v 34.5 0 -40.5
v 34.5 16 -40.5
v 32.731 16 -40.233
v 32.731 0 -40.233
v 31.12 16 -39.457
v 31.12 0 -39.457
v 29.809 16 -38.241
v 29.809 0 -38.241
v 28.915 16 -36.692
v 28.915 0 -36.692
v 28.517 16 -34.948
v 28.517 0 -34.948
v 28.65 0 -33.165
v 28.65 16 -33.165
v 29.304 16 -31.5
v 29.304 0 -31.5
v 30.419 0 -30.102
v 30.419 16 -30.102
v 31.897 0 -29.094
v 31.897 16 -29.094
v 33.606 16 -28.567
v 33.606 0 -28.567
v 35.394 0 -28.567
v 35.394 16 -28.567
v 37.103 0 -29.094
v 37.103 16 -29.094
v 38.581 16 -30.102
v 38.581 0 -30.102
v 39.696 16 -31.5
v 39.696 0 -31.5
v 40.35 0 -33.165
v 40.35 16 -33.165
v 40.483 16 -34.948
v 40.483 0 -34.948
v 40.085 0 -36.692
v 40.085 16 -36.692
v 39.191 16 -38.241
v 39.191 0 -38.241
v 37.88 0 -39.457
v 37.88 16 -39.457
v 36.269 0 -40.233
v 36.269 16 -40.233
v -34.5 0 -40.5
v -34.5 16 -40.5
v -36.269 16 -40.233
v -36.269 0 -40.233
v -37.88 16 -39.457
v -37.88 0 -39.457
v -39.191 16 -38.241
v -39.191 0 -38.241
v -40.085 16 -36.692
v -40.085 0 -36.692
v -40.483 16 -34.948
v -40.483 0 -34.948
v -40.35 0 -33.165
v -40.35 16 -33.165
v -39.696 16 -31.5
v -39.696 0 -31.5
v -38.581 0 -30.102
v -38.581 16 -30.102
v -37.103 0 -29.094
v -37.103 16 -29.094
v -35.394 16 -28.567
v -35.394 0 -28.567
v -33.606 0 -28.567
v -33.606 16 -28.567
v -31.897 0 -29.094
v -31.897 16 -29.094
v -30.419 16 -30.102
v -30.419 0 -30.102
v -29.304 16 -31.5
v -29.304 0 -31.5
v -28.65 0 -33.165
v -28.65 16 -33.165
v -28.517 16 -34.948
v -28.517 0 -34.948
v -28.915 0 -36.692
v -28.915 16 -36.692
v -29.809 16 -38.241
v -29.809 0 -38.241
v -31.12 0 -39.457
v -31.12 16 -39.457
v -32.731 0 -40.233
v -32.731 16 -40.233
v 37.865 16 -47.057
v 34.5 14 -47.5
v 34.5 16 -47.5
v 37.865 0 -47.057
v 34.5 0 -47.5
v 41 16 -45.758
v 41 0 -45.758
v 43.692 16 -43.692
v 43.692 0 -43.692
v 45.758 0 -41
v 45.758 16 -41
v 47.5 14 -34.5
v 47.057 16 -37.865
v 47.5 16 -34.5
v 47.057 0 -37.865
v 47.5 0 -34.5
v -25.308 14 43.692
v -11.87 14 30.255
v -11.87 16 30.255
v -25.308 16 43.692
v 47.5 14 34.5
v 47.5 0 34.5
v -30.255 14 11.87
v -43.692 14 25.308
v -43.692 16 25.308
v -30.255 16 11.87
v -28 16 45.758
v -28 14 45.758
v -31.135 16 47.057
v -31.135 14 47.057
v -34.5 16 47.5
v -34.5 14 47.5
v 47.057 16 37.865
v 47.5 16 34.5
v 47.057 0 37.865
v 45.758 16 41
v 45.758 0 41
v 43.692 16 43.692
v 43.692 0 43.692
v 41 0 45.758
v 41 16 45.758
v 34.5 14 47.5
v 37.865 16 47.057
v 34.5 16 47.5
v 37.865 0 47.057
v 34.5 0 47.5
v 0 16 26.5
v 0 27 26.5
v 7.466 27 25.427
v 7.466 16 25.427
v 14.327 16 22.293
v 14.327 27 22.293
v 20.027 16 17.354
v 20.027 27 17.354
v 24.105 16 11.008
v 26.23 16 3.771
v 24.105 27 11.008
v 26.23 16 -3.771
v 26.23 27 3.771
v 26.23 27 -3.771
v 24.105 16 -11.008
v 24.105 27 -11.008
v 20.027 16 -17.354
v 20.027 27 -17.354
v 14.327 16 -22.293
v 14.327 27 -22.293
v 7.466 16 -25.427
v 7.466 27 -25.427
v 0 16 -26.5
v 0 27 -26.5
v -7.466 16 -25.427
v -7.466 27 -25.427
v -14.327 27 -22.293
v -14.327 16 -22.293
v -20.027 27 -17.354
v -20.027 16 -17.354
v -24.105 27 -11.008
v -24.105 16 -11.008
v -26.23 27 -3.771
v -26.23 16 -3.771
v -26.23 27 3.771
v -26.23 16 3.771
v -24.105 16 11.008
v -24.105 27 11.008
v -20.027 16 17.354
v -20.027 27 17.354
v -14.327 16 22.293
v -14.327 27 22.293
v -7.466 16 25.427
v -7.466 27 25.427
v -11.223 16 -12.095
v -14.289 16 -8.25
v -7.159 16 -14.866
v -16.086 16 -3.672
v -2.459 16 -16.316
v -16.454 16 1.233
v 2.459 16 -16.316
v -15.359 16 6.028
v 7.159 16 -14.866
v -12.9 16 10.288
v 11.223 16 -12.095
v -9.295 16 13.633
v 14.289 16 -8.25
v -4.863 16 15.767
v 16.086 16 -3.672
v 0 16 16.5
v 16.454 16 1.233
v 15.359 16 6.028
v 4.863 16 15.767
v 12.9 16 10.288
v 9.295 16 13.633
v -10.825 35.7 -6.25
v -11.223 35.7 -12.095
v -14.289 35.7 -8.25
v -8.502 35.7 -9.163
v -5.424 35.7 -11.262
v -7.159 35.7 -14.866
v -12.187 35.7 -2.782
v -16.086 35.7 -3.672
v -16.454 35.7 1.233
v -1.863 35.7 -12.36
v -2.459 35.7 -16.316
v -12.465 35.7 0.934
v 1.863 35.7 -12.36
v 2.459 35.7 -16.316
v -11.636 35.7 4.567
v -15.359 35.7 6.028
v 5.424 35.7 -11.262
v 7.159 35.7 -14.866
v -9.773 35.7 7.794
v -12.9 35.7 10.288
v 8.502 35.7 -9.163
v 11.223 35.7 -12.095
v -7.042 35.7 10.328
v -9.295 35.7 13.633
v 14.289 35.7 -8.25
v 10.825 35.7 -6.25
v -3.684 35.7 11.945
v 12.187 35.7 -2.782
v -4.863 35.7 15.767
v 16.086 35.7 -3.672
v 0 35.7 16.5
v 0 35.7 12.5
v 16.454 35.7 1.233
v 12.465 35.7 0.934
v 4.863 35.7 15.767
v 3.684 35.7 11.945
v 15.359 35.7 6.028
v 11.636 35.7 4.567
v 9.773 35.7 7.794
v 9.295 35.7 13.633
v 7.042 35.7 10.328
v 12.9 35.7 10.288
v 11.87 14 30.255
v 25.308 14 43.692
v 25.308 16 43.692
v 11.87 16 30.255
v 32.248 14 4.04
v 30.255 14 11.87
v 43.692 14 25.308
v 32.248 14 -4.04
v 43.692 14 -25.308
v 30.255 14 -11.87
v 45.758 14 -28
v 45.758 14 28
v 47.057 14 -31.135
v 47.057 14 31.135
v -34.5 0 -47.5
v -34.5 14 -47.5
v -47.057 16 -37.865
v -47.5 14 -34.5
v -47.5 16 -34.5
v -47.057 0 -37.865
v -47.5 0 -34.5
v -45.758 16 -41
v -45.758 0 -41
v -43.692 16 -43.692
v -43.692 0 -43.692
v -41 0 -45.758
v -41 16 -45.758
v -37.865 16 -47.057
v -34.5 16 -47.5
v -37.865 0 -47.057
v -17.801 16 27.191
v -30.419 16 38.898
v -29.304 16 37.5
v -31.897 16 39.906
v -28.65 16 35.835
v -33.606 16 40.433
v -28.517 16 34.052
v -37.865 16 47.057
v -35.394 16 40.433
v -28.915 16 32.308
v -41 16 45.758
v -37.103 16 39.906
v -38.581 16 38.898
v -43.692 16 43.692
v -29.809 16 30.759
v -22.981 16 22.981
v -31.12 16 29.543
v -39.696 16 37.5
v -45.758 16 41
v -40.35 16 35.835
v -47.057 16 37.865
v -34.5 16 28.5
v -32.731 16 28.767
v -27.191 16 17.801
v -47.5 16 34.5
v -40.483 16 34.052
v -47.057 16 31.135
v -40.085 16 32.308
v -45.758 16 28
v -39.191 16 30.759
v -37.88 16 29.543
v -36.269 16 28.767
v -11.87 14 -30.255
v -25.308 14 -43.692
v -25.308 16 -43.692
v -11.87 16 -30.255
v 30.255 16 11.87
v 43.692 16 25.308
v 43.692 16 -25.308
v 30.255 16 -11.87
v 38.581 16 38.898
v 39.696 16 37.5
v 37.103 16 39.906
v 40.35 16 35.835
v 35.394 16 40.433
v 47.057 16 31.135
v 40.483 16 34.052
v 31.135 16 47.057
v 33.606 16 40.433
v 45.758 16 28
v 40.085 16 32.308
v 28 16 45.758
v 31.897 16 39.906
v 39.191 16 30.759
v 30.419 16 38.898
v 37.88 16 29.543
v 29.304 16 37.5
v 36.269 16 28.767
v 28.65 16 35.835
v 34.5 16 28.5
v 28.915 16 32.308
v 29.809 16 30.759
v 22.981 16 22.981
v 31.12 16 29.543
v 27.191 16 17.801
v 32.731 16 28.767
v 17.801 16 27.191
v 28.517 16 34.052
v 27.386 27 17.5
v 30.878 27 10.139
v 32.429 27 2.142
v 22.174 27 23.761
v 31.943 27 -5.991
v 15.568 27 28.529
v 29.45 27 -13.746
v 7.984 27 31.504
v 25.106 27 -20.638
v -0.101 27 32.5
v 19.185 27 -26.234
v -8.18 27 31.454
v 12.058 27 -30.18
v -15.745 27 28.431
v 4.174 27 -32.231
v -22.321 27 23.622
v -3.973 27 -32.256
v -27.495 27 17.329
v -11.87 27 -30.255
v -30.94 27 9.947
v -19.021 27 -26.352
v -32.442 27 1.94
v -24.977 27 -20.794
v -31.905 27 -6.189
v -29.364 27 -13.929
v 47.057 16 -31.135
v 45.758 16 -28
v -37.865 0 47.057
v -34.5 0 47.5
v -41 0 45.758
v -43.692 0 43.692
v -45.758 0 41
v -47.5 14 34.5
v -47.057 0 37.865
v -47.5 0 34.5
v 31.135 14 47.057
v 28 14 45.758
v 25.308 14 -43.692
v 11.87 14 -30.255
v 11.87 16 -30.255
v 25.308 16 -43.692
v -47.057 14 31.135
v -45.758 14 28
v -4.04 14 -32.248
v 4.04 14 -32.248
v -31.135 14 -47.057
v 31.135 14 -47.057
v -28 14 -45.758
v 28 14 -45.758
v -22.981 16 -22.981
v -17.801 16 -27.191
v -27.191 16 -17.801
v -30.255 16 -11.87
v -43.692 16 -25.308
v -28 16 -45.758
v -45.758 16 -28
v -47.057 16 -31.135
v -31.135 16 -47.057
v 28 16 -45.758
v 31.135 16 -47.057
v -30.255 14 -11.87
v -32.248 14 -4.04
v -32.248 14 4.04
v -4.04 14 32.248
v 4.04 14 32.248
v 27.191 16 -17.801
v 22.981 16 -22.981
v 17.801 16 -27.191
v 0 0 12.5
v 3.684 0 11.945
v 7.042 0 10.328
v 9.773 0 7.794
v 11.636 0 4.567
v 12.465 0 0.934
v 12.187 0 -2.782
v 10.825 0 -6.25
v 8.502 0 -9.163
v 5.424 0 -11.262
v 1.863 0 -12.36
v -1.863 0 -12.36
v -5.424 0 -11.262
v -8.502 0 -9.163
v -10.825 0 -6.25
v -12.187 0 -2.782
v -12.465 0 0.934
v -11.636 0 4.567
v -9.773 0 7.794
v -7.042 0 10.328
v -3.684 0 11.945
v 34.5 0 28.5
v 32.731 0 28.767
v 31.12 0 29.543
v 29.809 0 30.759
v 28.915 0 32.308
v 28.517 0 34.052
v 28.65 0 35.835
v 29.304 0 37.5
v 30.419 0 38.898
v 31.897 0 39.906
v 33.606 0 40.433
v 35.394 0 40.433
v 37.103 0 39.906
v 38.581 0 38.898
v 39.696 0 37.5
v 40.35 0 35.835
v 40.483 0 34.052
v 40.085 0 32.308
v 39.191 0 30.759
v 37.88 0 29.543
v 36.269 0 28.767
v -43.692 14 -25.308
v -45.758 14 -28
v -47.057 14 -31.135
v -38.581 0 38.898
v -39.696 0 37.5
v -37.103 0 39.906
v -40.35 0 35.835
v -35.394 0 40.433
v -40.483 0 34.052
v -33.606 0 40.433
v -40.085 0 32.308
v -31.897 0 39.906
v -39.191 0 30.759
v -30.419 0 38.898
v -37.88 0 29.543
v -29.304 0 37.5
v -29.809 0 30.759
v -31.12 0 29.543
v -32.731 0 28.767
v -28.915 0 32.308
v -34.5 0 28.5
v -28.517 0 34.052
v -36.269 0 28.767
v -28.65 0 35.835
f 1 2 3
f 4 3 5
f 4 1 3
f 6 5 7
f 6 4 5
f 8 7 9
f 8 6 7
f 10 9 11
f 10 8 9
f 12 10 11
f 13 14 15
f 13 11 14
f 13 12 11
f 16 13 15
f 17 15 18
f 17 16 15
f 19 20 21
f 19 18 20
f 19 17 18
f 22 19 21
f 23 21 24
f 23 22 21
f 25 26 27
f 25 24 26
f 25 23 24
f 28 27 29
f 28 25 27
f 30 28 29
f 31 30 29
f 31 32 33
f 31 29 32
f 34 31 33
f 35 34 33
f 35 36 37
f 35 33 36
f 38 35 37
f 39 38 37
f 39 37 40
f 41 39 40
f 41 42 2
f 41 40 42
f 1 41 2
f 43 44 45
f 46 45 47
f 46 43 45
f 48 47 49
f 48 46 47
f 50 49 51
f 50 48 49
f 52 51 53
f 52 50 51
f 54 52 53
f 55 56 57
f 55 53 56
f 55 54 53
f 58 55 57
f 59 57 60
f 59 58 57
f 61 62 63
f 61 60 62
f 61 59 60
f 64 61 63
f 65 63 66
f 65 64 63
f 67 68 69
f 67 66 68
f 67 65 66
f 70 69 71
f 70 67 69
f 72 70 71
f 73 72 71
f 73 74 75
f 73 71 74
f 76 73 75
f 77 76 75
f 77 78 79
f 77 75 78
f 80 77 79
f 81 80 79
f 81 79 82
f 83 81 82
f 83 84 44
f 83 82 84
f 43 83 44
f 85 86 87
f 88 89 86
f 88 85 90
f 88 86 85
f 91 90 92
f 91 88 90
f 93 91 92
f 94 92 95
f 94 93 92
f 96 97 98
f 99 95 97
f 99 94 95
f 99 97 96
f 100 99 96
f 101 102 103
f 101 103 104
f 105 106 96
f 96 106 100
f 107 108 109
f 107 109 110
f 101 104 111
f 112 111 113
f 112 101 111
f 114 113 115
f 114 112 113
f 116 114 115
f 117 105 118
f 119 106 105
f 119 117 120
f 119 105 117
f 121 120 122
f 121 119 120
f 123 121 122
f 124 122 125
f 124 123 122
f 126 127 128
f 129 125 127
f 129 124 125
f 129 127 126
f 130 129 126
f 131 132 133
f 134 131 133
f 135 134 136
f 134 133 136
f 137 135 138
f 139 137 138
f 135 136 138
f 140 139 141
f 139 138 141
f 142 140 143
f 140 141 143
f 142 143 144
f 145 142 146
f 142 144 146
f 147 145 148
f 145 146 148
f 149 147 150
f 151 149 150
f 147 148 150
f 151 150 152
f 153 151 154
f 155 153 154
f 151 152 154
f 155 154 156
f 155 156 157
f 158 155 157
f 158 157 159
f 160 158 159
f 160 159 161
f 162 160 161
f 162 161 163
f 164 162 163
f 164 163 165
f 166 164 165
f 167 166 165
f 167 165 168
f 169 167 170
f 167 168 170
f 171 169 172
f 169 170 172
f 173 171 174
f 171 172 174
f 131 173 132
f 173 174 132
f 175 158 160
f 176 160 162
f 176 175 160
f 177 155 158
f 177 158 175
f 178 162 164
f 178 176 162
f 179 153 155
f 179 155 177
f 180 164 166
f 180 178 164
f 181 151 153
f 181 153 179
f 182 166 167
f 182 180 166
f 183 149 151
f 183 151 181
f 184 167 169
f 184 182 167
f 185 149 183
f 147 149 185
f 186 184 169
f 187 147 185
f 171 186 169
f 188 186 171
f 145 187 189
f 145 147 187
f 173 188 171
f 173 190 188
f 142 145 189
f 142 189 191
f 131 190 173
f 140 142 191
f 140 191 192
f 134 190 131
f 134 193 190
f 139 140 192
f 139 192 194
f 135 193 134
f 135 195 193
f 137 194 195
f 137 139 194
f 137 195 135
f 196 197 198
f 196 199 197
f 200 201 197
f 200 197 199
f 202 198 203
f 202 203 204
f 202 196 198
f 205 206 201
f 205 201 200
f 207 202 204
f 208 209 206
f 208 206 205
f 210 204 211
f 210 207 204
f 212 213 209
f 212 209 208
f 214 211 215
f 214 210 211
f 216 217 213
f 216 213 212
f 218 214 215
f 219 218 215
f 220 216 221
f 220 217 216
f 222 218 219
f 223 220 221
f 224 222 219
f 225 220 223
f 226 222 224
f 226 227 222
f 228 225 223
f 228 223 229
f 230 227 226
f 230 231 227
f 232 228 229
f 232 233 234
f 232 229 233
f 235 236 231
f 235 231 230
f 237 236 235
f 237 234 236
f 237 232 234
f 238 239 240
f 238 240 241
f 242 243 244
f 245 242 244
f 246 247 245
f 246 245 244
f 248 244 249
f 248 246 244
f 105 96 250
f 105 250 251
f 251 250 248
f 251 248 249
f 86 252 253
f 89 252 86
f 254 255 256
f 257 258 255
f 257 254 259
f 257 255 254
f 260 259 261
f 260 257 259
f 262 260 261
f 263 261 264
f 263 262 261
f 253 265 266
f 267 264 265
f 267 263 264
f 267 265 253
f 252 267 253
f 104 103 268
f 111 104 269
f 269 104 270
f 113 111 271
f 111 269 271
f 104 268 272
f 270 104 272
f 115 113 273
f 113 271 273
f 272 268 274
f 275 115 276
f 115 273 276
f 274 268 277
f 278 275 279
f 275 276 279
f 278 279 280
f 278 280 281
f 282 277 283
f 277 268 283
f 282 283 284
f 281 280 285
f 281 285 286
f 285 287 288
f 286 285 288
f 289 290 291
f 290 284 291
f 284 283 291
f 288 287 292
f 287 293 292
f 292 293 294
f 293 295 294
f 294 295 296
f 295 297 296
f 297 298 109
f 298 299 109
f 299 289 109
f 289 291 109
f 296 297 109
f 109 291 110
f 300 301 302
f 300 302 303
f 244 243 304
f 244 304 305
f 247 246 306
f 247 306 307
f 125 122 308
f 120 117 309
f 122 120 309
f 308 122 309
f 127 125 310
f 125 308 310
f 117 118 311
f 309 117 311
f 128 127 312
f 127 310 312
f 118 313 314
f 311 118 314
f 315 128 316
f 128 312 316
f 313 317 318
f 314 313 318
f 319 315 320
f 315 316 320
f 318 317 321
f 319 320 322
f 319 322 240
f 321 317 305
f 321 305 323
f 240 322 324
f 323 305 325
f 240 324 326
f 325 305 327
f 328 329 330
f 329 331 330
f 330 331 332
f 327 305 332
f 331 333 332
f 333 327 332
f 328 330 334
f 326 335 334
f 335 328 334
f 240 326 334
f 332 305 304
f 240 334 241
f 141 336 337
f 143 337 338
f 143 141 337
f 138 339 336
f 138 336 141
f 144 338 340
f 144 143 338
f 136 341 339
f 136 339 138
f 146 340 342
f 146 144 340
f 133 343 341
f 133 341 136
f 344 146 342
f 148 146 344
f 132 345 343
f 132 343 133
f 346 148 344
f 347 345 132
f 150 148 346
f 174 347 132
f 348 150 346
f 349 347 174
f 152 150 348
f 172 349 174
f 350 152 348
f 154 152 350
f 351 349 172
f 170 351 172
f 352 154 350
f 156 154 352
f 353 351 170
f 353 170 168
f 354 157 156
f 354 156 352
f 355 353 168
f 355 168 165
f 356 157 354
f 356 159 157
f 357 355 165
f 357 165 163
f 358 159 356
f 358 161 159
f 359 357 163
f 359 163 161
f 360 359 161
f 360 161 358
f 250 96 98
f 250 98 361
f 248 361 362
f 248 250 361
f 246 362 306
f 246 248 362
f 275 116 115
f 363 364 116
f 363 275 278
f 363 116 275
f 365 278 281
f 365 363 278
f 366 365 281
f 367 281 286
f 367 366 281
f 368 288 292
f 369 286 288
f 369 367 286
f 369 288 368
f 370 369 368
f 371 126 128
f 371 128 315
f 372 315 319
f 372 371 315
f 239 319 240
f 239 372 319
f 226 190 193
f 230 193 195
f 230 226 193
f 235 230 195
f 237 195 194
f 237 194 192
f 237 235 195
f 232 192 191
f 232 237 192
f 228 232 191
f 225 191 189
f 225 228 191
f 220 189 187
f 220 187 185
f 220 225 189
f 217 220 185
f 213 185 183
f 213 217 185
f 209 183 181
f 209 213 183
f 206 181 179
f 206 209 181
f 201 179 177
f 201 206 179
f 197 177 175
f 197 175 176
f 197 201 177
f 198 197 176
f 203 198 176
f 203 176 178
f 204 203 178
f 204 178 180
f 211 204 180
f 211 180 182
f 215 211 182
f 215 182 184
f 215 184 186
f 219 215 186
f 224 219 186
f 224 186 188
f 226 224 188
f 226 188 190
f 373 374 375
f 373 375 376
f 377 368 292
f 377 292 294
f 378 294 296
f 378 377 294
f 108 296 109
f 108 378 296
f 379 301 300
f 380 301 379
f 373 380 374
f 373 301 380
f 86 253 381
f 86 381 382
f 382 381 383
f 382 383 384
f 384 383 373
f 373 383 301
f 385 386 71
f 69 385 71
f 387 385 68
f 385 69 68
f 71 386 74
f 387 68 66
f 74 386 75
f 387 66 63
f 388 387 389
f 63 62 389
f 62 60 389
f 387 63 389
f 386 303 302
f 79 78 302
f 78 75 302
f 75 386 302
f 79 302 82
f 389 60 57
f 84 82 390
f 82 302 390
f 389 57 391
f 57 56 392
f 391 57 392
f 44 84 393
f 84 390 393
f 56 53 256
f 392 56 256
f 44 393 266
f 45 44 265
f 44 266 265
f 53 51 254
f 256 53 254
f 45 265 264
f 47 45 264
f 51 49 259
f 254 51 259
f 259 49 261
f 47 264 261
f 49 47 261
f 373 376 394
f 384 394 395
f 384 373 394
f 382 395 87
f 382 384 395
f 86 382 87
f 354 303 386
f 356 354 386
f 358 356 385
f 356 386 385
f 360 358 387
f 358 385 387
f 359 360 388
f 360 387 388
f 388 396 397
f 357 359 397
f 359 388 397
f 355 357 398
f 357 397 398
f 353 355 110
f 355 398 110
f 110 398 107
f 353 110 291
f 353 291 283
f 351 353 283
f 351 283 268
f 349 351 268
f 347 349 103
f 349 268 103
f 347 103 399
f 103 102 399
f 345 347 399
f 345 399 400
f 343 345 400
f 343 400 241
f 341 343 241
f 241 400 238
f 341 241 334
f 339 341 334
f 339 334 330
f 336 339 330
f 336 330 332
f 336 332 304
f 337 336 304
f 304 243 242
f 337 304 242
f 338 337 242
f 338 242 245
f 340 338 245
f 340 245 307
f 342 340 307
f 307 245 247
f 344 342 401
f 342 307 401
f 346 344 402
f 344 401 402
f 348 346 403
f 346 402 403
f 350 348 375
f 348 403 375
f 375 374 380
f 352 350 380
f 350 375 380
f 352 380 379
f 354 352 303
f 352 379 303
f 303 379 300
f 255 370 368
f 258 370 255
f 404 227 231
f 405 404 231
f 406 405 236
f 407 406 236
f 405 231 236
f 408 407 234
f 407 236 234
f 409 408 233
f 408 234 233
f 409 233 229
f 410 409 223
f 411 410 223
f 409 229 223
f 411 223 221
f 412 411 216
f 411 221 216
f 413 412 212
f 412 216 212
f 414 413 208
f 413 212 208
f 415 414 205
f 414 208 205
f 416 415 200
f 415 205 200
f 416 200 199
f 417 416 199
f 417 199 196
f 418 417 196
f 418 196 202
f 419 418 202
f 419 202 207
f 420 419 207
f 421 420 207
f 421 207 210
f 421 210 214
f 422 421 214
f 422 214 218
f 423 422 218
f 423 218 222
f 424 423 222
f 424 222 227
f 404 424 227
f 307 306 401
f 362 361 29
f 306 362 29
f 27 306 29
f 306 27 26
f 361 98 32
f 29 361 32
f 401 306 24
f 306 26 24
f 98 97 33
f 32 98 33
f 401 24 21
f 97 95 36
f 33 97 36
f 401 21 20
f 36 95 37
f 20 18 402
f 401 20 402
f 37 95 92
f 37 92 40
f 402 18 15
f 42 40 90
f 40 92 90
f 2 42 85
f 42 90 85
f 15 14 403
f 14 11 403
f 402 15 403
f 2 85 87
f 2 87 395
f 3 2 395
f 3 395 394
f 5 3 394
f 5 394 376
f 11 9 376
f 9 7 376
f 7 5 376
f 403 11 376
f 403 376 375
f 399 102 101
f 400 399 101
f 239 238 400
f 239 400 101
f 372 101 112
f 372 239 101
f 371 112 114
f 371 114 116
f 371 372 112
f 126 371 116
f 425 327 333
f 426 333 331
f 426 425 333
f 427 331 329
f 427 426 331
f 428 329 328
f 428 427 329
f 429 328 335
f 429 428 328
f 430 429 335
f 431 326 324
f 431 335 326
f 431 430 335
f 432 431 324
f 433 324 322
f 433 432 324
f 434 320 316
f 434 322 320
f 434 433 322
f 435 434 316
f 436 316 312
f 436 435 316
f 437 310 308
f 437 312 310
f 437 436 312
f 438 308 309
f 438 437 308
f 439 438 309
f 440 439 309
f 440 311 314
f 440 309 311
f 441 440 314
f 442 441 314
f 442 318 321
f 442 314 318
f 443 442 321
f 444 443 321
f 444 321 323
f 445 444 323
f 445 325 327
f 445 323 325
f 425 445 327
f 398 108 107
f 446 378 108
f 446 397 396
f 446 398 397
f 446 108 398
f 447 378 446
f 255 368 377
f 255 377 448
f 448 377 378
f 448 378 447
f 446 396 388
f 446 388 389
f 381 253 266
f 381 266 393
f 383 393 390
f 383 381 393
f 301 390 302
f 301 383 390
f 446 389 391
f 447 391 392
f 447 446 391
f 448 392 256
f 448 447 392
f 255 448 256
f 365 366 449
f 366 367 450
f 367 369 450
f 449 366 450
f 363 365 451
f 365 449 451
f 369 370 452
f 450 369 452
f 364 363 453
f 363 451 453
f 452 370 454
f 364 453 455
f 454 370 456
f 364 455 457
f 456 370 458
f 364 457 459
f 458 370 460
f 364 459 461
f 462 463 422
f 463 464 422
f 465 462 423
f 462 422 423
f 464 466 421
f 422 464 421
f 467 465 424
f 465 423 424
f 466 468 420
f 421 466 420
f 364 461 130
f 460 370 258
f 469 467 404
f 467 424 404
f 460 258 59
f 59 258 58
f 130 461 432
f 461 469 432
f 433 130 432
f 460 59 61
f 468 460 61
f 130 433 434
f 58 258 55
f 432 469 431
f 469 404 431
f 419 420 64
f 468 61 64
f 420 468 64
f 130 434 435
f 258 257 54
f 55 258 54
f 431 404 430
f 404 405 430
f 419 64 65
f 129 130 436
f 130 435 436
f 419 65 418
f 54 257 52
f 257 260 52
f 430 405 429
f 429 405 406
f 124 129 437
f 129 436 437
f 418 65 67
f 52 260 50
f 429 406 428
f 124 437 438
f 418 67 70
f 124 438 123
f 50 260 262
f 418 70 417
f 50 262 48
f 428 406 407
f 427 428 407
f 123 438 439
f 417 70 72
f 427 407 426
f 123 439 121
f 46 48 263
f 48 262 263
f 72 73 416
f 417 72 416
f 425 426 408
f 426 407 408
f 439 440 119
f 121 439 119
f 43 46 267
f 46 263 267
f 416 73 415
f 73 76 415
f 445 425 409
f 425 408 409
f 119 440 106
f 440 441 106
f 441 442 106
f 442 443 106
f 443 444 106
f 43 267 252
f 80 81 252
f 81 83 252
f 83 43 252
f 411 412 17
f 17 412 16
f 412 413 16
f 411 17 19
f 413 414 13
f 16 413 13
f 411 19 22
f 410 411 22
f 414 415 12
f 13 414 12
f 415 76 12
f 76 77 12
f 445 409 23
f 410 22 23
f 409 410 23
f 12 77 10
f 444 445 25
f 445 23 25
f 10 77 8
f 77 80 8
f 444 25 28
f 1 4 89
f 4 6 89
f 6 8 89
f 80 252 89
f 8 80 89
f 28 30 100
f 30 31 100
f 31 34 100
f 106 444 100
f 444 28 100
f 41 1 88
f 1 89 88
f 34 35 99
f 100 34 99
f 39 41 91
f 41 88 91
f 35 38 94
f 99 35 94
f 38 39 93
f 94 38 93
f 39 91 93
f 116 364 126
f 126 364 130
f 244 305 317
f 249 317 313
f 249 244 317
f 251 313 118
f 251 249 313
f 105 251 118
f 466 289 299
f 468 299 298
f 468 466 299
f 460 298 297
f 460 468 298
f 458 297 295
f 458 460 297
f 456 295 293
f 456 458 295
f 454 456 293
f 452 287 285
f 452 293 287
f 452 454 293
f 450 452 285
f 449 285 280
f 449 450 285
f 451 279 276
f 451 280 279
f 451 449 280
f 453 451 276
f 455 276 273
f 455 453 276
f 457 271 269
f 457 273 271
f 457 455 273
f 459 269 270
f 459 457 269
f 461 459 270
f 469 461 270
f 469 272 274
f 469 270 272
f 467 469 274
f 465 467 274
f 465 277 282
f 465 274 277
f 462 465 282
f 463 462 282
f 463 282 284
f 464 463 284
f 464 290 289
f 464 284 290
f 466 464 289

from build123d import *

# Parameters (mm, degrees)
SKETCH1_W           = 95
SKETCH1_H           = 95
BOSS_EXTRUDE1_DEPTH = 14
BOSS_EXTRUDE2_DEPTH = 16
SKETCH4_R           = 32.5
BOSS_EXTRUDE3_DEPTH = 13
SKETCH5_R           = 12.5
CUT_EXTRUDE1_DEPTH  = 73.398204398
SKETCH6_R           = 26.5
SKETCH6_R_2         = 16.5
CUT_EXTRUDE2_DEPTH  = 11
BOSS_EXTRUDE4_START = 35.7
SKETCH7_R           = 16.5
SKETCH7_R_2         = 12.5
BOSS_EXTRUDE4_DEPTH = 35.7
CUT_EXTRUDE3_DEPTH  = 77.072268272
SKETCH9_R           = 6
CUT_EXTRUDE5_DEPTH  = 77.072268272


with BuildPart() as part:
    # Sketch1 → Boss-Extrude1 (new body)
    with BuildSketch(Plane(origin=(0, 0, 0), x_dir=(1, 0, 0), z_dir=(0, 1, 0))):
        Rectangle(SKETCH1_W, SKETCH1_H)
    extrude(amount=BOSS_EXTRUDE1_DEPTH)

    # Sketch2 → Boss-Extrude2 (add)
    with BuildSketch(Plane(origin=(0, 0, 0), x_dir=(1, 0, 0), z_dir=(0, 1, 0))):
        with BuildLine():
            Line((-30.254795425, 11.870019114), (-43.692388155, 25.307611845))
            ThreePointArc((-43.692388155, 25.307611845), (-43.692388155, 43.692388155), (-25.307611845, 43.692388155))
            Line((-25.307611845, 43.692388155), (-11.870019114, 30.254795425))
            ThreePointArc((-11.870019114, 30.254795425), (-22.980970389, 22.980970389), (-30.254795425, 11.870019114))
        make_face()
        with BuildLine():
            Line((11.870019114, 30.254795425), (25.307611845, 43.692388155))
            ThreePointArc((25.307611845, 43.692388155), (43.692388155, 43.692388155), (43.692388155, 25.307611845))
            Line((43.692388155, 25.307611845), (30.254795425, 11.870019114))
            ThreePointArc((30.254795425, 11.870019114), (22.980970389, 22.980970389), (11.870019114, 30.254795425))
        make_face()
        with BuildLine():
            Line((30.254795425, -11.870019114), (43.692388155, -25.307611845))
            ThreePointArc((43.692388155, -25.307611845), (43.692388155, -43.692388155), (25.307611845, -43.692388155))
            Line((25.307611845, -43.692388155), (11.870019114, -30.254795425))
            ThreePointArc((11.870019114, -30.254795425), (22.980970389, -22.980970389), (30.254795425, -11.870019114))
        make_face()
        with BuildLine():
            Line((-11.870019114, -30.254795425), (-25.307611845, -43.692388155))
            ThreePointArc((-25.307611845, -43.692388155), (-43.692388155, -43.692388155), (-43.692388155, -25.307611845))
            Line((-43.692388155, -25.307611845), (-30.254795425, -11.870019114))
            ThreePointArc((-30.254795425, -11.870019114), (-22.980970389, -22.980970389), (-11.870019114, -30.254795425))
        make_face()
    extrude(amount=BOSS_EXTRUDE2_DEPTH)

    # Sketch4 → Boss-Extrude3 (add)
    with BuildSketch(Plane(origin=(0, 14, 0), x_dir=(1, 0, 0), z_dir=(0, 1, 0))):
        with Locations(Location((0, 0, 0), (0, 0, 111.421821522))):
            Circle(SKETCH4_R)
    extrude(amount=BOSS_EXTRUDE3_DEPTH)

    # Sketch5 → Cut-Extrude1 (cut, through all)
    with BuildSketch(Plane(origin=(0, 27, 0), x_dir=(1, 0, 0), z_dir=(0, 1, 0))):
        with Locations(Location((0, 0, 0), (0, 0, 270))):
            Circle(SKETCH5_R)
    extrude(amount=-CUT_EXTRUDE1_DEPTH, mode=Mode.SUBTRACT)

    # Sketch6 → Cut-Extrude2 (cut)
    with BuildSketch(Plane(origin=(0, 27, 0), x_dir=(1, 0, 0), z_dir=(0, 1, 0))):
        with Locations(Location((0, 0, 0), (0, 0, 270))):
            Circle(SKETCH6_R)
        with Locations(Location((0, 0, 0), (0, 0, 270))):
            Circle(SKETCH6_R_2, mode=Mode.SUBTRACT)
    extrude(amount=-CUT_EXTRUDE2_DEPTH, mode=Mode.SUBTRACT)

    # Sketch7 → Boss-Extrude4 (add)
    with BuildSketch(Plane(origin=(0, 0, 0), x_dir=(1, 0, 0), z_dir=(0, 1, 0)).offset(BOSS_EXTRUDE4_START)):
        with Locations(Location((0, 0, 0), (0, 0, 270))):
            Circle(SKETCH7_R)
        with Locations(Location((0, 0, 0), (0, 0, 270))):
            Circle(SKETCH7_R_2, mode=Mode.SUBTRACT)
    extrude(amount=-BOSS_EXTRUDE4_DEPTH)

    # Sketch8 → Cut-Extrude3 (cut, through all)
    with BuildSketch(Plane(origin=(0, 0, 0), x_dir=(1, 0, 0), z_dir=(0, 1, 0))):
        with BuildLine():
            Line((-47.5, -34.5), (-47.5, -47.5))
            Line((-47.5, -47.5), (-34.5, -47.5))
            ThreePointArc((-34.5, -47.5), (-43.692388155, -43.692388155), (-47.5, -34.5))
        make_face()
        with BuildLine():
            Line((-34.5, 47.5), (-47.5, 47.5))
            Line((-47.5, 47.5), (-47.5, 34.5))
            ThreePointArc((-47.5, 34.5), (-43.692388155, 43.692388155), (-34.5, 47.5))
        make_face()
        with BuildLine():
            Line((47.5, 34.5), (47.5, 47.5))
            Line((47.5, 47.5), (34.5, 47.5))
            ThreePointArc((34.5, 47.5), (43.692388155, 43.692388155), (47.5, 34.5))
        make_face()
        with BuildLine():
            Line((34.5, -47.5), (47.5, -47.5))
            Line((47.5, -47.5), (47.5, -34.5))
            ThreePointArc((47.5, -34.5), (43.692388155, -43.692388155), (34.5, -47.5))
        make_face()
    extrude(amount=CUT_EXTRUDE3_DEPTH, mode=Mode.SUBTRACT)

    # Sketch9 → Cut-Extrude5 (cut, through all)
    with BuildSketch(Plane(origin=(0, 0, 0), x_dir=(1, 0, 0), z_dir=(0, 1, 0))):
        with Locations(Location((-34.5, 34.5, 0), (0, 0, 90))):
            Circle(SKETCH9_R)
        with Locations(Location((34.5, 34.5, 0), (0, 0, 90))):
            Circle(SKETCH9_R)
        with Locations(Location((34.5, -34.5, 0), (0, 0, 90))):
            Circle(SKETCH9_R)
        with Locations(Location((-34.5, -34.5, 0), (0, 0, 90))):
            Circle(SKETCH9_R)
    extrude(amount=CUT_EXTRUDE5_DEPTH, mode=Mode.SUBTRACT)


solid = part.part
